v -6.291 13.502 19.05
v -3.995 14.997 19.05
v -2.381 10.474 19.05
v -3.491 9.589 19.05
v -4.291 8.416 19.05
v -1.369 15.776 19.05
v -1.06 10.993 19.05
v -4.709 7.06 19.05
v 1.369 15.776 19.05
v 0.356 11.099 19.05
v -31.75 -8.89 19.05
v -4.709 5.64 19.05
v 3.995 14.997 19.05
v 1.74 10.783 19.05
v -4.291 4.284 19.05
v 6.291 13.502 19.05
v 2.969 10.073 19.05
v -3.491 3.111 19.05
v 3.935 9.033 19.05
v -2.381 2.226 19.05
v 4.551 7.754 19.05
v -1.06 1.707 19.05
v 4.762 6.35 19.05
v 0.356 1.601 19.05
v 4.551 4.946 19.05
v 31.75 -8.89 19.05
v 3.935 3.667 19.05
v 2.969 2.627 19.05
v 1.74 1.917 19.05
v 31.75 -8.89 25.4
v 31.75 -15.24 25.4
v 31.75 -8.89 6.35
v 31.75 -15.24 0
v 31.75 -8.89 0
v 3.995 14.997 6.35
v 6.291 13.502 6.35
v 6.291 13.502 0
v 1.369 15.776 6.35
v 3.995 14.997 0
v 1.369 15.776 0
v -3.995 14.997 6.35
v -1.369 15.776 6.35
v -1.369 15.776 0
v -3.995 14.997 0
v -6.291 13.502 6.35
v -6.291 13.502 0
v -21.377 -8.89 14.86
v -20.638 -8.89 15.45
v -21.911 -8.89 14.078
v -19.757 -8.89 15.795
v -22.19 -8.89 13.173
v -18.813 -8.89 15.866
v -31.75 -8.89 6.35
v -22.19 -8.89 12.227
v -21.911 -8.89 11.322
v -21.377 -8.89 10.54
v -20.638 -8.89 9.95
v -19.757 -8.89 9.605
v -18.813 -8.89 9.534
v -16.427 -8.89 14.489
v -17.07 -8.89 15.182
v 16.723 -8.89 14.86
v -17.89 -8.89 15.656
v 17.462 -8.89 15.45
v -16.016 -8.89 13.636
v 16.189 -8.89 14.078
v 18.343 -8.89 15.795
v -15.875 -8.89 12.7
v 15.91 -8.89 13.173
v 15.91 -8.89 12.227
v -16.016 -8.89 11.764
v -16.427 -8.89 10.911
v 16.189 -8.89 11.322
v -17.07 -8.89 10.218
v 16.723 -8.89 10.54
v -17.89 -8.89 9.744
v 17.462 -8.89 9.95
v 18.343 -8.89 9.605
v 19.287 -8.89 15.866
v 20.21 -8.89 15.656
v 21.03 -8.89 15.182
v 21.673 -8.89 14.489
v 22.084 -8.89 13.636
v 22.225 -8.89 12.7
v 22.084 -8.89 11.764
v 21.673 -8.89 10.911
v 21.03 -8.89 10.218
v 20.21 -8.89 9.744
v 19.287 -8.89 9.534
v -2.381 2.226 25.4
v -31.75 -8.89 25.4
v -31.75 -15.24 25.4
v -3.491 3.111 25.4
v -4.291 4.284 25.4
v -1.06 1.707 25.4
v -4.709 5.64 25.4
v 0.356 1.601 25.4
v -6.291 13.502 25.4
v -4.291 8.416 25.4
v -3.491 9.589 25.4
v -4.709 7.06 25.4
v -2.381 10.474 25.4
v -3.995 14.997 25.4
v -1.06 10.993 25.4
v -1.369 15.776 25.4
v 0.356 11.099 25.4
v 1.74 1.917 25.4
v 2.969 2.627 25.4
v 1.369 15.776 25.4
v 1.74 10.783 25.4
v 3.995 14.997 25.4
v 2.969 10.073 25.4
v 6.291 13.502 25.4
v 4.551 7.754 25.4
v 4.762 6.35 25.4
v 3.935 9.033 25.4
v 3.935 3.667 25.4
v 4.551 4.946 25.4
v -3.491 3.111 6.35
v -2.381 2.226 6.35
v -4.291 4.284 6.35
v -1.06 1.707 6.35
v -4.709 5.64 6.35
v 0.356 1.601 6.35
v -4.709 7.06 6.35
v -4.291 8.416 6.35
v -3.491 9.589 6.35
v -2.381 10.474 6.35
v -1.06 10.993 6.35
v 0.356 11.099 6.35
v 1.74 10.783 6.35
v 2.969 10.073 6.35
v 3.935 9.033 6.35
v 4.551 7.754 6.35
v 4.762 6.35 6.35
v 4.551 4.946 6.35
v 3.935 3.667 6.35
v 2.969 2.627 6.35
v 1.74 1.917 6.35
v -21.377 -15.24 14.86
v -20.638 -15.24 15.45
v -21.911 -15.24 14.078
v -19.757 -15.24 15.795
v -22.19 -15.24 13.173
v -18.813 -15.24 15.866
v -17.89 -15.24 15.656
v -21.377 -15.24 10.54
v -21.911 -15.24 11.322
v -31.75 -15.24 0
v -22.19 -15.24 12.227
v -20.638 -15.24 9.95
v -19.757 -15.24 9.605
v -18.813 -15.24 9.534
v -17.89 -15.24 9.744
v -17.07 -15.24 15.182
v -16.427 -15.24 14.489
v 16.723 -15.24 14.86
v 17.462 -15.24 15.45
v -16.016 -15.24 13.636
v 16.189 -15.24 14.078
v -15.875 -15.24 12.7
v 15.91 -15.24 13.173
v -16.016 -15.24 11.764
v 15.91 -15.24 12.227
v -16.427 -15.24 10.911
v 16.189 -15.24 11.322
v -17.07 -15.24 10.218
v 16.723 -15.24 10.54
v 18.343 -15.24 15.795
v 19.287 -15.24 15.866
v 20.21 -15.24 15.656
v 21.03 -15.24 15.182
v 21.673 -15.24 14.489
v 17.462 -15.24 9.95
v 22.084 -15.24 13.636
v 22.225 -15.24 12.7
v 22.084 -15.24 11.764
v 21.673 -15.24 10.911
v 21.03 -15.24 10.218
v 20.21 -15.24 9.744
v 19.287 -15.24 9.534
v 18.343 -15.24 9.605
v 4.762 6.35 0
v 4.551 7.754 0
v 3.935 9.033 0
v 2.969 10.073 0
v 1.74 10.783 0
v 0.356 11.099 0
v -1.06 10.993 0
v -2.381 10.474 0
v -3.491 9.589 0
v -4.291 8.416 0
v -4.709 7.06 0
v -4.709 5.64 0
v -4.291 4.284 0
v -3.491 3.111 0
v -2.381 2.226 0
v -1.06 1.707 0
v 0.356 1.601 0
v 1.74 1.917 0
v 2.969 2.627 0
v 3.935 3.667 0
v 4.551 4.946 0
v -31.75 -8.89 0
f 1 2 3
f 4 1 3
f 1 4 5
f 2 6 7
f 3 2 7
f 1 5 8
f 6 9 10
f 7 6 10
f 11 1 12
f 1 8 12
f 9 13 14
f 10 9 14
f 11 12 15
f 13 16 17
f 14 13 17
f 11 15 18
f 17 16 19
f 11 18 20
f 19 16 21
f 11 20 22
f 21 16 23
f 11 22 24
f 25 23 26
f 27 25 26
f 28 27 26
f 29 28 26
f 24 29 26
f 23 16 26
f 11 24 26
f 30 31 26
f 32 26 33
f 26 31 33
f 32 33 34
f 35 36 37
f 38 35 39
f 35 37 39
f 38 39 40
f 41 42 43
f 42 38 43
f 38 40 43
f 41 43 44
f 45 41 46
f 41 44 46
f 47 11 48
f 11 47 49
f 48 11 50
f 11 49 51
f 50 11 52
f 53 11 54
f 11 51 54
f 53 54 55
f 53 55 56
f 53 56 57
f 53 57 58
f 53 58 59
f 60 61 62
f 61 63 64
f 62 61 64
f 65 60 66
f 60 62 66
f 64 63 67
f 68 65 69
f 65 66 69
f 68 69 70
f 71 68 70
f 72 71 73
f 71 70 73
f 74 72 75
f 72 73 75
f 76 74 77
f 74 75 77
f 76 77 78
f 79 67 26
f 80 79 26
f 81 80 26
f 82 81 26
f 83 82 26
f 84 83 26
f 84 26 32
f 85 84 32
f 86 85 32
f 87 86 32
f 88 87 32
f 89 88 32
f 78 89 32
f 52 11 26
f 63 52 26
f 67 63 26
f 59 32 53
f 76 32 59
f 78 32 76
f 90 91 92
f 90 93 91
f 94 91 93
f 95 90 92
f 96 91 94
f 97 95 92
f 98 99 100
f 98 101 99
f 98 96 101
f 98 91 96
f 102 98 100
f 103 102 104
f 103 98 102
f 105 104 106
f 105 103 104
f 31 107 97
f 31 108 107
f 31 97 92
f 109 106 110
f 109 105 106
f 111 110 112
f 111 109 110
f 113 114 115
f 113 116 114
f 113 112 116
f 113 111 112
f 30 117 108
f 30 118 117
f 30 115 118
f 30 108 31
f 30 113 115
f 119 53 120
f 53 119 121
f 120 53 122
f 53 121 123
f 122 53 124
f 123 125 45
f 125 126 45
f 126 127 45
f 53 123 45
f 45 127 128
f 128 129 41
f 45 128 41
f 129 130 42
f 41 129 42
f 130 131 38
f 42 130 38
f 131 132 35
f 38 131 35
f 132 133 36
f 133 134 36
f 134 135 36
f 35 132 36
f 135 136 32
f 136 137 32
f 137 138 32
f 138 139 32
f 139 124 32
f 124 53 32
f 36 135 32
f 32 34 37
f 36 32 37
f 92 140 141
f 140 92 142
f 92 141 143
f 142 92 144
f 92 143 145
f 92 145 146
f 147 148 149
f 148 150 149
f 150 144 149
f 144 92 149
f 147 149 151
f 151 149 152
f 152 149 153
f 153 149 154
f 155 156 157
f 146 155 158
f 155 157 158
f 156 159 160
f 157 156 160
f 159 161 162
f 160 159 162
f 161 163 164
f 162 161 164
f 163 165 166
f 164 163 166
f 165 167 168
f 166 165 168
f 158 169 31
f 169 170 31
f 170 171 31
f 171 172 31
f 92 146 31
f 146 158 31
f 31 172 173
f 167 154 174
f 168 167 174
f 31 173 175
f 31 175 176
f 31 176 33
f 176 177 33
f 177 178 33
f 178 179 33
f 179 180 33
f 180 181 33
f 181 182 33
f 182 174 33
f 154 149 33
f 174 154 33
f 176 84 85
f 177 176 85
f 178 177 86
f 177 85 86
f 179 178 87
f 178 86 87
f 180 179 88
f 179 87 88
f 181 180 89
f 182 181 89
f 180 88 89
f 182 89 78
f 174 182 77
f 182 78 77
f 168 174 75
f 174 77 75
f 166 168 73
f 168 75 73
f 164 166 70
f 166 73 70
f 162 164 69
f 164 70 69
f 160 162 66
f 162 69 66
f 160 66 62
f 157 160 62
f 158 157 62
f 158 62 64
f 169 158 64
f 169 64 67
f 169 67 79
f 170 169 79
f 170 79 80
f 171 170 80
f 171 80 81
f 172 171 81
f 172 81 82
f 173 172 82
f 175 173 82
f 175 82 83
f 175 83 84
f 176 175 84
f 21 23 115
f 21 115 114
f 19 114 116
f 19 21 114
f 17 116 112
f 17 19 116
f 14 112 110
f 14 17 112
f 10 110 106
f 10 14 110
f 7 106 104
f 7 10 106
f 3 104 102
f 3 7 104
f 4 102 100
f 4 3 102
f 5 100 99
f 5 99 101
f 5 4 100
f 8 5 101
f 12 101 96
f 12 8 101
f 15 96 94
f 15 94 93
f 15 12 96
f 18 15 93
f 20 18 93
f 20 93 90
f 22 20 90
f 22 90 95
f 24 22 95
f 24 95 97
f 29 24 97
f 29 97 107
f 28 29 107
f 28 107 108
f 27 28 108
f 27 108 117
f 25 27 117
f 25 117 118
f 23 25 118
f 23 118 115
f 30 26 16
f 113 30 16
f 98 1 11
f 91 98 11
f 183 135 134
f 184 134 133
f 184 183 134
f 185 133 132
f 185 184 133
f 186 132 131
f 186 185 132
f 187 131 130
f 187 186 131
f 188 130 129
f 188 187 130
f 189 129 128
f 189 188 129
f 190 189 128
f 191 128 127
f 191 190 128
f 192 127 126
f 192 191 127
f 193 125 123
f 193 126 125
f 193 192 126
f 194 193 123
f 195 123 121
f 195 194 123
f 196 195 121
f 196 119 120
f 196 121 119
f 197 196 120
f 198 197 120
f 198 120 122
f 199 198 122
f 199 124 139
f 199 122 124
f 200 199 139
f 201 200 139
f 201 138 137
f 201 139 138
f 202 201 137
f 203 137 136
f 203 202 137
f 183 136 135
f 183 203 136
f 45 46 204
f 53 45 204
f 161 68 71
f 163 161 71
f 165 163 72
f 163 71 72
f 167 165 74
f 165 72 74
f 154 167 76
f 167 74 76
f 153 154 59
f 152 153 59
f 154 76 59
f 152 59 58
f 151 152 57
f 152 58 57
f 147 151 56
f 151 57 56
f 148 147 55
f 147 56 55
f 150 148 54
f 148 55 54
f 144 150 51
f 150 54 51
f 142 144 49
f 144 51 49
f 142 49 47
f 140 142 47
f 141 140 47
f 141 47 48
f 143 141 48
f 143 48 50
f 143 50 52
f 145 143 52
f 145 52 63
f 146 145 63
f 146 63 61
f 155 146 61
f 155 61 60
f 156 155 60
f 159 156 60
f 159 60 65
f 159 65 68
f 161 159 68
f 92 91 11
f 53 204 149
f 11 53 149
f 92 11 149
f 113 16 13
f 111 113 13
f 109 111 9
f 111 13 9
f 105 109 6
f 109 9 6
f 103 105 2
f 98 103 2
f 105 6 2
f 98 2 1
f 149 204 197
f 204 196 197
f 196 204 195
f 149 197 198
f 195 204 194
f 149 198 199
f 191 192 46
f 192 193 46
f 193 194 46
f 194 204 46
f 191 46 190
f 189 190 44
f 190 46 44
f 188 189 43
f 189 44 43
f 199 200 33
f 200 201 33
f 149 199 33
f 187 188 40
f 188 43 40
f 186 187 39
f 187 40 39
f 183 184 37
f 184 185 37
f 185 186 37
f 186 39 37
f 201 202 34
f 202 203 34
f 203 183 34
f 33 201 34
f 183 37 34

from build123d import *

# Parameters (mm, degrees)
SKETCH1_R           = 4.7625
BOSS_EXTRUDE1_DEPTH = 25.4
SKETCH2_W           = 12.7
SKETCH2_H           = 8.89
SKETCH2_H_2         = 18.382780547
CUT_EXTRUDE1_DEPTH  = 64.5
SKETCH3_R           = 3.175
CUT_EXTRUDE2_DEPTH  = 7.35


with BuildPart() as part:
    # Sketch1 → Boss-Extrude1 (new body)
    with BuildSketch(Plane.XY):
        with BuildLine():
            Line((31.75, -8.89), (6.29056934, 13.502227791))
            ThreePointArc((6.29056934, 13.502227791), (0, 15.875), (-6.29056934, 13.502227791))
            Line((-6.29056934, 13.502227791), (-31.75, -8.89))
            Line((-31.75, -8.89), (-31.75, -15.24))
            Line((-31.75, -15.24), (31.75, -15.24))
            Line((31.75, -15.24), (31.75, -8.89))
        make_face()
        with Locations((0, 6.35)):
            Circle(SKETCH1_R, mode=Mode.SUBTRACT)
    extrude(amount=BOSS_EXTRUDE1_DEPTH)

    # Sketch2 → Cut-Extrude1 (cut, through all)
    with BuildSketch(Plane(origin=(31.75, 0, 0), x_dir=(0, 0, -1), z_dir=(1, 0, 0))):
        with Locations((-12.7, -4.445)):
            Rectangle(SKETCH2_W, SKETCH2_H)
        with Locations((-12.7, 9.191390273)):
            Rectangle(SKETCH2_W, SKETCH2_H_2)
    extrude(amount=-CUT_EXTRUDE1_DEPTH, mode=Mode.SUBTRACT)

    # Sketch3 → Cut-Extrude2 (cut, through all)
    with BuildSketch(Plane(origin=(0, -8.89, 0), x_dir=(1, 0, 0), z_dir=(0, 1, 0))):
        with Locations((-19.05, -12.7)):
            Circle(SKETCH3_R)
        with Locations((19.05, -12.7)):
            Circle(SKETCH3_R)
    extrude(amount=-CUT_EXTRUDE2_DEPTH, mode=Mode.SUBTRACT)


solid = part.part
